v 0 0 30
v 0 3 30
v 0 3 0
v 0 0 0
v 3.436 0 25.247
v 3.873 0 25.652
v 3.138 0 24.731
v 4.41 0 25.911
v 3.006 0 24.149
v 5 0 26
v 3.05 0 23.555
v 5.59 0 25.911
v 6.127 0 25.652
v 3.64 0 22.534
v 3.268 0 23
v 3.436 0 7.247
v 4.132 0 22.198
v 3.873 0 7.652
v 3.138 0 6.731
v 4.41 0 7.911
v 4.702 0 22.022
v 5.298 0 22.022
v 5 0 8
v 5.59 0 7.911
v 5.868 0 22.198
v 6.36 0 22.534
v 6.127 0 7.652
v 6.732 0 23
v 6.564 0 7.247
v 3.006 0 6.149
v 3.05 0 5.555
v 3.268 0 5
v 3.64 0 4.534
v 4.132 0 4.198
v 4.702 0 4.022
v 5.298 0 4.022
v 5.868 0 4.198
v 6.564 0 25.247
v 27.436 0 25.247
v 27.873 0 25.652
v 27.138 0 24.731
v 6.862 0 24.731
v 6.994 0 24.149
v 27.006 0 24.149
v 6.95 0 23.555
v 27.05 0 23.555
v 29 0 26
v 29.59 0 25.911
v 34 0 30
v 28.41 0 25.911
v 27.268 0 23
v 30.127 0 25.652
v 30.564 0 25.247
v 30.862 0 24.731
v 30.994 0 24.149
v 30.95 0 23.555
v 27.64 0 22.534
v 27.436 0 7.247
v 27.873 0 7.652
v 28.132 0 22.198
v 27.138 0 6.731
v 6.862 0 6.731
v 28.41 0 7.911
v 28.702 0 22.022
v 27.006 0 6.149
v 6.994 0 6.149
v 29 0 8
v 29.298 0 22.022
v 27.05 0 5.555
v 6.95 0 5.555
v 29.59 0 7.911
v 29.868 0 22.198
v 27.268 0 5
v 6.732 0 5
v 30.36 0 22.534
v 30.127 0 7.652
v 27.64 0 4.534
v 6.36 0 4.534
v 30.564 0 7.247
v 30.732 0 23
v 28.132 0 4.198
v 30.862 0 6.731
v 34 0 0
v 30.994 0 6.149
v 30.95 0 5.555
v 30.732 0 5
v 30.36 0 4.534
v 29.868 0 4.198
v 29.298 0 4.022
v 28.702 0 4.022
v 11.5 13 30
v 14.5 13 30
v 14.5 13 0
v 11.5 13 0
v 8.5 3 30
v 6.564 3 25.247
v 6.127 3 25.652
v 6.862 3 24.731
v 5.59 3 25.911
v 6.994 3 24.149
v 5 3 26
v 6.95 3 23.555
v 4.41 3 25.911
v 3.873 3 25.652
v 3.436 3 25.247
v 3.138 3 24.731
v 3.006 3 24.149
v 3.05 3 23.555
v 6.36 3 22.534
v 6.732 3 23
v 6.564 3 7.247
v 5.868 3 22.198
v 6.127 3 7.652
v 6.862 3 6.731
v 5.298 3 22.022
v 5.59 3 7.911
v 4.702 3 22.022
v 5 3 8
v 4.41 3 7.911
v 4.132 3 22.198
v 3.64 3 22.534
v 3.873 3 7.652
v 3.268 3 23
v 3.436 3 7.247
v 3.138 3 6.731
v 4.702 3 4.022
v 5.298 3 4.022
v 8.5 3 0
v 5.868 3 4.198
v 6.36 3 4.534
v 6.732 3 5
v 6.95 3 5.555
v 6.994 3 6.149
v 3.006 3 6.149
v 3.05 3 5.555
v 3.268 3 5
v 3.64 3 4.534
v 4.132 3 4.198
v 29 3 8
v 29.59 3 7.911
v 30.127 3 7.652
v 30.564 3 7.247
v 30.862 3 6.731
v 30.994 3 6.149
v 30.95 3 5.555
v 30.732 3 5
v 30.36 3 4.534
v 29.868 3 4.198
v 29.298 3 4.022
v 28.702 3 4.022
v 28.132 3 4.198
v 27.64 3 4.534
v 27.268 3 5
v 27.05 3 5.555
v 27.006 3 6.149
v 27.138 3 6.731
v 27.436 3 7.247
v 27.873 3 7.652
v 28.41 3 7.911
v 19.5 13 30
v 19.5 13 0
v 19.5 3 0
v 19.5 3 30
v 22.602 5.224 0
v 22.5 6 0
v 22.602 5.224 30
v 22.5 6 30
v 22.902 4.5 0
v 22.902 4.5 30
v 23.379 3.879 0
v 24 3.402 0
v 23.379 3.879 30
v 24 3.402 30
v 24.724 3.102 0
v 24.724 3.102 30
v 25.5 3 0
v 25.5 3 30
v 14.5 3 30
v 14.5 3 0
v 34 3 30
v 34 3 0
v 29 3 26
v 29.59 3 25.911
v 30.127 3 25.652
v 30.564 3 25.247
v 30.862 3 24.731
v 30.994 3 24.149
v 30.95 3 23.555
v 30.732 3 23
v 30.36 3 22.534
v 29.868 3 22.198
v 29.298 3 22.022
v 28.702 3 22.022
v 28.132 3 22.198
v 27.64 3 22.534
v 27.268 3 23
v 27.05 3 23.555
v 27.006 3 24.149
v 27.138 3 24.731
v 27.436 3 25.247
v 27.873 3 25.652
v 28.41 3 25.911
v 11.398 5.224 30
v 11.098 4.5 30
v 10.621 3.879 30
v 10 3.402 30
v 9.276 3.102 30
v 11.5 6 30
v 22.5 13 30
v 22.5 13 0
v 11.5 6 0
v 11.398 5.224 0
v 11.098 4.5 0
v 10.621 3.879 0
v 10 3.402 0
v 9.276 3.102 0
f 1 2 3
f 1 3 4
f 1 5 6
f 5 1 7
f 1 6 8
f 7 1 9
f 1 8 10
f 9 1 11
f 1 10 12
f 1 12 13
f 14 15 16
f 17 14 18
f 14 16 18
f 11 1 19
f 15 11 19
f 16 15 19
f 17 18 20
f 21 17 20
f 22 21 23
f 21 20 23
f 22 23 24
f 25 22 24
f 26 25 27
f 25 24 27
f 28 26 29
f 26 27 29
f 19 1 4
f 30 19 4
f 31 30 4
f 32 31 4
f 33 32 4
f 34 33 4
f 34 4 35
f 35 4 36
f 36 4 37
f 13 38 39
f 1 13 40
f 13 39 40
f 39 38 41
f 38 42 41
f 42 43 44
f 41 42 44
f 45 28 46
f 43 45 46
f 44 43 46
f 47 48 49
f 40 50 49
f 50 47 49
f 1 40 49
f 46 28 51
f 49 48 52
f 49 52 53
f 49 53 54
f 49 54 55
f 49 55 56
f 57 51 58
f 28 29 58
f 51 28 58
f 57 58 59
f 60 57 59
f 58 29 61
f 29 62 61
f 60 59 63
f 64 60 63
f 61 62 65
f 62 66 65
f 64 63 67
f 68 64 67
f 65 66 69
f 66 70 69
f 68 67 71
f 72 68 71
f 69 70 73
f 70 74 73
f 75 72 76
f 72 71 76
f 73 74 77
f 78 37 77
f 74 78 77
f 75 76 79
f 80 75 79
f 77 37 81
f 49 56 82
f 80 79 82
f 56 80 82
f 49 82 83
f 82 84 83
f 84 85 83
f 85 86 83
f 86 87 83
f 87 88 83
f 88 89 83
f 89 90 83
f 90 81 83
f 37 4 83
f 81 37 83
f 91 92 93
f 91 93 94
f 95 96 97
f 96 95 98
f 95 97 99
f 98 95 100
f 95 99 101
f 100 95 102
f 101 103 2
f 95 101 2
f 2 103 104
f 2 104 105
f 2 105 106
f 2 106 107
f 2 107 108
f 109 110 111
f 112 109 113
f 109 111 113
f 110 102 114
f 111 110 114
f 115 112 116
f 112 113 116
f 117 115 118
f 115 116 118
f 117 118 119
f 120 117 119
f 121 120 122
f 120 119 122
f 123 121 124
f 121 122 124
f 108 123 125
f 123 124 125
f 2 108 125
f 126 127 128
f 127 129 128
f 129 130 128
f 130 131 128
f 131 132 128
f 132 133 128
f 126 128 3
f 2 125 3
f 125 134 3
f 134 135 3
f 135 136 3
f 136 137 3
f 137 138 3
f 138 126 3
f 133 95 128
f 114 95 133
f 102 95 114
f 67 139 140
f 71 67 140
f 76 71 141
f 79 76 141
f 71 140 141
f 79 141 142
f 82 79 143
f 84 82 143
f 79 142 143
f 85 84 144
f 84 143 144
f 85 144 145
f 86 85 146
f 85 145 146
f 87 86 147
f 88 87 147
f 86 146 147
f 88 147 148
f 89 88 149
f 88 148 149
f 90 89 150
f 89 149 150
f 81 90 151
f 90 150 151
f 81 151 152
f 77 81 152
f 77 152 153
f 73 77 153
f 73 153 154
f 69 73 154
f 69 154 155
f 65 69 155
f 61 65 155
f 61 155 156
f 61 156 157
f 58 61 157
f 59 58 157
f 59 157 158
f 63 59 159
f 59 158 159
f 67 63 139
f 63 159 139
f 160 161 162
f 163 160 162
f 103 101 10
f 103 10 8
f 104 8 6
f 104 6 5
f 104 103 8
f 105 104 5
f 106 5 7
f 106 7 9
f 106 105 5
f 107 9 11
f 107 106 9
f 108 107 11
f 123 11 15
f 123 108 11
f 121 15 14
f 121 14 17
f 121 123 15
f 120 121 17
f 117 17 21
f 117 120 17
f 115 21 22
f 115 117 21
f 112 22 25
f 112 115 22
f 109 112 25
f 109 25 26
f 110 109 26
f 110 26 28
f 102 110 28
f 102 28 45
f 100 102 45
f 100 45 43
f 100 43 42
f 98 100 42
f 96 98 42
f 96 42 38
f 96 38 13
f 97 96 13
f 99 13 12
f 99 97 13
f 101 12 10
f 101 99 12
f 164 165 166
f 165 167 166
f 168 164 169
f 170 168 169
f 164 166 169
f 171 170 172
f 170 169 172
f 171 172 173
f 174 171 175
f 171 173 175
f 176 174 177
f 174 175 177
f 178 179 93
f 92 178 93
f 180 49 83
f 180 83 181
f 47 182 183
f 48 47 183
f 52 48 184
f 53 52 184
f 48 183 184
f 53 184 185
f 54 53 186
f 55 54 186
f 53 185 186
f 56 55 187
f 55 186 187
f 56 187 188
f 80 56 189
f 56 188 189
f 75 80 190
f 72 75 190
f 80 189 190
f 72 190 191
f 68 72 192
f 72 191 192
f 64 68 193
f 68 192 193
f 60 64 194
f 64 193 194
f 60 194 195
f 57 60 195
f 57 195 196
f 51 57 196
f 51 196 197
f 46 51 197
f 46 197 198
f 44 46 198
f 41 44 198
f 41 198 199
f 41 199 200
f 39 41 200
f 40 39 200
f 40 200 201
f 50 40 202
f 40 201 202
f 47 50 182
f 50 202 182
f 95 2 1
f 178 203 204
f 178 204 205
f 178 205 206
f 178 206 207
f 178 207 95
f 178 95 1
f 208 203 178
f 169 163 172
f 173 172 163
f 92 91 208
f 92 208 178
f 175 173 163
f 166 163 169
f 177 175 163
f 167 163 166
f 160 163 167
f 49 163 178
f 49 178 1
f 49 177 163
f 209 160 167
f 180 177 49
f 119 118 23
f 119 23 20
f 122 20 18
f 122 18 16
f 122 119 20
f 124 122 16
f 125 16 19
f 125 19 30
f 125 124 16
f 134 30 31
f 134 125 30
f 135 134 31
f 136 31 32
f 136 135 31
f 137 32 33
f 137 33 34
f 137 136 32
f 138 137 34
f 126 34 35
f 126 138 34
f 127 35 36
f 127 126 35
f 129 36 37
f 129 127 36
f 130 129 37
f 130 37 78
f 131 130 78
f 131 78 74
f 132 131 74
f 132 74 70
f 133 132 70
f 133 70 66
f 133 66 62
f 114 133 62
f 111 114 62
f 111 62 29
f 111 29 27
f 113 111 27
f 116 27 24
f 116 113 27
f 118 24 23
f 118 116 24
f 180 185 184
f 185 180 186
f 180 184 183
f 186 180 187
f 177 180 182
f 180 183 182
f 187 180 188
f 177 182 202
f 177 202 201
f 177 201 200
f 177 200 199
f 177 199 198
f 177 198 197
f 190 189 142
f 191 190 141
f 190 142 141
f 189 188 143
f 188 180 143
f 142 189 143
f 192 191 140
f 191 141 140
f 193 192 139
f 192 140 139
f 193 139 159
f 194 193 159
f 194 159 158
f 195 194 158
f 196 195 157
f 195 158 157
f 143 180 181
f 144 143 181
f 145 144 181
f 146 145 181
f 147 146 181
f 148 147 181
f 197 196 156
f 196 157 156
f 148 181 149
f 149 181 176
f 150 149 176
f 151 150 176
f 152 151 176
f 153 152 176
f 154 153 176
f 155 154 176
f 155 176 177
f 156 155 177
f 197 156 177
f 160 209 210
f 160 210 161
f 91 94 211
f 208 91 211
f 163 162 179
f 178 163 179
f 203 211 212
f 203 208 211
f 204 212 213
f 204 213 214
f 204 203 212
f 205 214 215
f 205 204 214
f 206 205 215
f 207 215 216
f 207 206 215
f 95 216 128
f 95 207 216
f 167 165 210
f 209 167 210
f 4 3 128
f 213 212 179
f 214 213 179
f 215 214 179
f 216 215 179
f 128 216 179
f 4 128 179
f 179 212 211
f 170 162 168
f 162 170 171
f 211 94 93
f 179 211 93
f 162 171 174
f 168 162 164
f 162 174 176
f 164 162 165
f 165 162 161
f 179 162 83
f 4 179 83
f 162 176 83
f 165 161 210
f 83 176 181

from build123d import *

# Parameters (mm, degrees)
BOSS_EXTRUDE1_DEPTH = 30
SKETCH2_R           = 2
CUT_EXTRUDE1_DEPTH  = 3
FILLET1_R           = 3


with BuildPart() as part:
    # Sketch1 → Boss-Extrude1 (new body)
    with BuildSketch(Plane(origin=(-298.953701388, 67.353578403, 0), x_dir=(1, 0, 0), z_dir=(0, 0, 1))):
        Polygon((318.453701388, -54.353578403), (318.453701388, -64.353578403), (313.453701388, -64.353578403), (313.453701388, -54.353578403), (310.453701388, -54.353578403), (310.453701388, -64.353578403), (298.953701388, -64.353578403), (298.953701388, -67.353578403), (332.953701388, -67.353578403), (332.953701388, -64.353578403), (321.453701388, -64.353578403), (321.453701388, -54.353578403), align=None)
    extrude(amount=BOSS_EXTRUDE1_DEPTH)

    # Sketch2 → Cut-Extrude1 (cut)
    with BuildSketch(Plane(origin=(0, 3, 0), x_dir=(1, 0, 0), z_dir=(0, 1, 0))):
        with Locations(Location((29, -6, 0), (0, 0, 270))):
            Circle(SKETCH2_R)
        with Locations(Location((29, -24, 0), (0, 0, 270))):
            Circle(SKETCH2_R)
    cut_extrude1 = extrude(amount=-CUT_EXTRUDE1_DEPTH, mode=Mode.SUBTRACT)

    # Mirror1: Cut-Extrude1 across plane
    add(cut_extrude1.mirror(Plane(origin=(17, 0, 0), x_dir=(0, 0, 1), z_dir=(1, 0, 0))), mode=Mode.SUBTRACT)

    # Fillet1
    fillet1_edges = [part.edges().sort_by_distance(p)[0] for p in [
        (11.5, 3, 15),
        (22.5, 3, 15),
    ]]
    fillet(fillet1_edges, radius=FILLET1_R)


solid = part.part
